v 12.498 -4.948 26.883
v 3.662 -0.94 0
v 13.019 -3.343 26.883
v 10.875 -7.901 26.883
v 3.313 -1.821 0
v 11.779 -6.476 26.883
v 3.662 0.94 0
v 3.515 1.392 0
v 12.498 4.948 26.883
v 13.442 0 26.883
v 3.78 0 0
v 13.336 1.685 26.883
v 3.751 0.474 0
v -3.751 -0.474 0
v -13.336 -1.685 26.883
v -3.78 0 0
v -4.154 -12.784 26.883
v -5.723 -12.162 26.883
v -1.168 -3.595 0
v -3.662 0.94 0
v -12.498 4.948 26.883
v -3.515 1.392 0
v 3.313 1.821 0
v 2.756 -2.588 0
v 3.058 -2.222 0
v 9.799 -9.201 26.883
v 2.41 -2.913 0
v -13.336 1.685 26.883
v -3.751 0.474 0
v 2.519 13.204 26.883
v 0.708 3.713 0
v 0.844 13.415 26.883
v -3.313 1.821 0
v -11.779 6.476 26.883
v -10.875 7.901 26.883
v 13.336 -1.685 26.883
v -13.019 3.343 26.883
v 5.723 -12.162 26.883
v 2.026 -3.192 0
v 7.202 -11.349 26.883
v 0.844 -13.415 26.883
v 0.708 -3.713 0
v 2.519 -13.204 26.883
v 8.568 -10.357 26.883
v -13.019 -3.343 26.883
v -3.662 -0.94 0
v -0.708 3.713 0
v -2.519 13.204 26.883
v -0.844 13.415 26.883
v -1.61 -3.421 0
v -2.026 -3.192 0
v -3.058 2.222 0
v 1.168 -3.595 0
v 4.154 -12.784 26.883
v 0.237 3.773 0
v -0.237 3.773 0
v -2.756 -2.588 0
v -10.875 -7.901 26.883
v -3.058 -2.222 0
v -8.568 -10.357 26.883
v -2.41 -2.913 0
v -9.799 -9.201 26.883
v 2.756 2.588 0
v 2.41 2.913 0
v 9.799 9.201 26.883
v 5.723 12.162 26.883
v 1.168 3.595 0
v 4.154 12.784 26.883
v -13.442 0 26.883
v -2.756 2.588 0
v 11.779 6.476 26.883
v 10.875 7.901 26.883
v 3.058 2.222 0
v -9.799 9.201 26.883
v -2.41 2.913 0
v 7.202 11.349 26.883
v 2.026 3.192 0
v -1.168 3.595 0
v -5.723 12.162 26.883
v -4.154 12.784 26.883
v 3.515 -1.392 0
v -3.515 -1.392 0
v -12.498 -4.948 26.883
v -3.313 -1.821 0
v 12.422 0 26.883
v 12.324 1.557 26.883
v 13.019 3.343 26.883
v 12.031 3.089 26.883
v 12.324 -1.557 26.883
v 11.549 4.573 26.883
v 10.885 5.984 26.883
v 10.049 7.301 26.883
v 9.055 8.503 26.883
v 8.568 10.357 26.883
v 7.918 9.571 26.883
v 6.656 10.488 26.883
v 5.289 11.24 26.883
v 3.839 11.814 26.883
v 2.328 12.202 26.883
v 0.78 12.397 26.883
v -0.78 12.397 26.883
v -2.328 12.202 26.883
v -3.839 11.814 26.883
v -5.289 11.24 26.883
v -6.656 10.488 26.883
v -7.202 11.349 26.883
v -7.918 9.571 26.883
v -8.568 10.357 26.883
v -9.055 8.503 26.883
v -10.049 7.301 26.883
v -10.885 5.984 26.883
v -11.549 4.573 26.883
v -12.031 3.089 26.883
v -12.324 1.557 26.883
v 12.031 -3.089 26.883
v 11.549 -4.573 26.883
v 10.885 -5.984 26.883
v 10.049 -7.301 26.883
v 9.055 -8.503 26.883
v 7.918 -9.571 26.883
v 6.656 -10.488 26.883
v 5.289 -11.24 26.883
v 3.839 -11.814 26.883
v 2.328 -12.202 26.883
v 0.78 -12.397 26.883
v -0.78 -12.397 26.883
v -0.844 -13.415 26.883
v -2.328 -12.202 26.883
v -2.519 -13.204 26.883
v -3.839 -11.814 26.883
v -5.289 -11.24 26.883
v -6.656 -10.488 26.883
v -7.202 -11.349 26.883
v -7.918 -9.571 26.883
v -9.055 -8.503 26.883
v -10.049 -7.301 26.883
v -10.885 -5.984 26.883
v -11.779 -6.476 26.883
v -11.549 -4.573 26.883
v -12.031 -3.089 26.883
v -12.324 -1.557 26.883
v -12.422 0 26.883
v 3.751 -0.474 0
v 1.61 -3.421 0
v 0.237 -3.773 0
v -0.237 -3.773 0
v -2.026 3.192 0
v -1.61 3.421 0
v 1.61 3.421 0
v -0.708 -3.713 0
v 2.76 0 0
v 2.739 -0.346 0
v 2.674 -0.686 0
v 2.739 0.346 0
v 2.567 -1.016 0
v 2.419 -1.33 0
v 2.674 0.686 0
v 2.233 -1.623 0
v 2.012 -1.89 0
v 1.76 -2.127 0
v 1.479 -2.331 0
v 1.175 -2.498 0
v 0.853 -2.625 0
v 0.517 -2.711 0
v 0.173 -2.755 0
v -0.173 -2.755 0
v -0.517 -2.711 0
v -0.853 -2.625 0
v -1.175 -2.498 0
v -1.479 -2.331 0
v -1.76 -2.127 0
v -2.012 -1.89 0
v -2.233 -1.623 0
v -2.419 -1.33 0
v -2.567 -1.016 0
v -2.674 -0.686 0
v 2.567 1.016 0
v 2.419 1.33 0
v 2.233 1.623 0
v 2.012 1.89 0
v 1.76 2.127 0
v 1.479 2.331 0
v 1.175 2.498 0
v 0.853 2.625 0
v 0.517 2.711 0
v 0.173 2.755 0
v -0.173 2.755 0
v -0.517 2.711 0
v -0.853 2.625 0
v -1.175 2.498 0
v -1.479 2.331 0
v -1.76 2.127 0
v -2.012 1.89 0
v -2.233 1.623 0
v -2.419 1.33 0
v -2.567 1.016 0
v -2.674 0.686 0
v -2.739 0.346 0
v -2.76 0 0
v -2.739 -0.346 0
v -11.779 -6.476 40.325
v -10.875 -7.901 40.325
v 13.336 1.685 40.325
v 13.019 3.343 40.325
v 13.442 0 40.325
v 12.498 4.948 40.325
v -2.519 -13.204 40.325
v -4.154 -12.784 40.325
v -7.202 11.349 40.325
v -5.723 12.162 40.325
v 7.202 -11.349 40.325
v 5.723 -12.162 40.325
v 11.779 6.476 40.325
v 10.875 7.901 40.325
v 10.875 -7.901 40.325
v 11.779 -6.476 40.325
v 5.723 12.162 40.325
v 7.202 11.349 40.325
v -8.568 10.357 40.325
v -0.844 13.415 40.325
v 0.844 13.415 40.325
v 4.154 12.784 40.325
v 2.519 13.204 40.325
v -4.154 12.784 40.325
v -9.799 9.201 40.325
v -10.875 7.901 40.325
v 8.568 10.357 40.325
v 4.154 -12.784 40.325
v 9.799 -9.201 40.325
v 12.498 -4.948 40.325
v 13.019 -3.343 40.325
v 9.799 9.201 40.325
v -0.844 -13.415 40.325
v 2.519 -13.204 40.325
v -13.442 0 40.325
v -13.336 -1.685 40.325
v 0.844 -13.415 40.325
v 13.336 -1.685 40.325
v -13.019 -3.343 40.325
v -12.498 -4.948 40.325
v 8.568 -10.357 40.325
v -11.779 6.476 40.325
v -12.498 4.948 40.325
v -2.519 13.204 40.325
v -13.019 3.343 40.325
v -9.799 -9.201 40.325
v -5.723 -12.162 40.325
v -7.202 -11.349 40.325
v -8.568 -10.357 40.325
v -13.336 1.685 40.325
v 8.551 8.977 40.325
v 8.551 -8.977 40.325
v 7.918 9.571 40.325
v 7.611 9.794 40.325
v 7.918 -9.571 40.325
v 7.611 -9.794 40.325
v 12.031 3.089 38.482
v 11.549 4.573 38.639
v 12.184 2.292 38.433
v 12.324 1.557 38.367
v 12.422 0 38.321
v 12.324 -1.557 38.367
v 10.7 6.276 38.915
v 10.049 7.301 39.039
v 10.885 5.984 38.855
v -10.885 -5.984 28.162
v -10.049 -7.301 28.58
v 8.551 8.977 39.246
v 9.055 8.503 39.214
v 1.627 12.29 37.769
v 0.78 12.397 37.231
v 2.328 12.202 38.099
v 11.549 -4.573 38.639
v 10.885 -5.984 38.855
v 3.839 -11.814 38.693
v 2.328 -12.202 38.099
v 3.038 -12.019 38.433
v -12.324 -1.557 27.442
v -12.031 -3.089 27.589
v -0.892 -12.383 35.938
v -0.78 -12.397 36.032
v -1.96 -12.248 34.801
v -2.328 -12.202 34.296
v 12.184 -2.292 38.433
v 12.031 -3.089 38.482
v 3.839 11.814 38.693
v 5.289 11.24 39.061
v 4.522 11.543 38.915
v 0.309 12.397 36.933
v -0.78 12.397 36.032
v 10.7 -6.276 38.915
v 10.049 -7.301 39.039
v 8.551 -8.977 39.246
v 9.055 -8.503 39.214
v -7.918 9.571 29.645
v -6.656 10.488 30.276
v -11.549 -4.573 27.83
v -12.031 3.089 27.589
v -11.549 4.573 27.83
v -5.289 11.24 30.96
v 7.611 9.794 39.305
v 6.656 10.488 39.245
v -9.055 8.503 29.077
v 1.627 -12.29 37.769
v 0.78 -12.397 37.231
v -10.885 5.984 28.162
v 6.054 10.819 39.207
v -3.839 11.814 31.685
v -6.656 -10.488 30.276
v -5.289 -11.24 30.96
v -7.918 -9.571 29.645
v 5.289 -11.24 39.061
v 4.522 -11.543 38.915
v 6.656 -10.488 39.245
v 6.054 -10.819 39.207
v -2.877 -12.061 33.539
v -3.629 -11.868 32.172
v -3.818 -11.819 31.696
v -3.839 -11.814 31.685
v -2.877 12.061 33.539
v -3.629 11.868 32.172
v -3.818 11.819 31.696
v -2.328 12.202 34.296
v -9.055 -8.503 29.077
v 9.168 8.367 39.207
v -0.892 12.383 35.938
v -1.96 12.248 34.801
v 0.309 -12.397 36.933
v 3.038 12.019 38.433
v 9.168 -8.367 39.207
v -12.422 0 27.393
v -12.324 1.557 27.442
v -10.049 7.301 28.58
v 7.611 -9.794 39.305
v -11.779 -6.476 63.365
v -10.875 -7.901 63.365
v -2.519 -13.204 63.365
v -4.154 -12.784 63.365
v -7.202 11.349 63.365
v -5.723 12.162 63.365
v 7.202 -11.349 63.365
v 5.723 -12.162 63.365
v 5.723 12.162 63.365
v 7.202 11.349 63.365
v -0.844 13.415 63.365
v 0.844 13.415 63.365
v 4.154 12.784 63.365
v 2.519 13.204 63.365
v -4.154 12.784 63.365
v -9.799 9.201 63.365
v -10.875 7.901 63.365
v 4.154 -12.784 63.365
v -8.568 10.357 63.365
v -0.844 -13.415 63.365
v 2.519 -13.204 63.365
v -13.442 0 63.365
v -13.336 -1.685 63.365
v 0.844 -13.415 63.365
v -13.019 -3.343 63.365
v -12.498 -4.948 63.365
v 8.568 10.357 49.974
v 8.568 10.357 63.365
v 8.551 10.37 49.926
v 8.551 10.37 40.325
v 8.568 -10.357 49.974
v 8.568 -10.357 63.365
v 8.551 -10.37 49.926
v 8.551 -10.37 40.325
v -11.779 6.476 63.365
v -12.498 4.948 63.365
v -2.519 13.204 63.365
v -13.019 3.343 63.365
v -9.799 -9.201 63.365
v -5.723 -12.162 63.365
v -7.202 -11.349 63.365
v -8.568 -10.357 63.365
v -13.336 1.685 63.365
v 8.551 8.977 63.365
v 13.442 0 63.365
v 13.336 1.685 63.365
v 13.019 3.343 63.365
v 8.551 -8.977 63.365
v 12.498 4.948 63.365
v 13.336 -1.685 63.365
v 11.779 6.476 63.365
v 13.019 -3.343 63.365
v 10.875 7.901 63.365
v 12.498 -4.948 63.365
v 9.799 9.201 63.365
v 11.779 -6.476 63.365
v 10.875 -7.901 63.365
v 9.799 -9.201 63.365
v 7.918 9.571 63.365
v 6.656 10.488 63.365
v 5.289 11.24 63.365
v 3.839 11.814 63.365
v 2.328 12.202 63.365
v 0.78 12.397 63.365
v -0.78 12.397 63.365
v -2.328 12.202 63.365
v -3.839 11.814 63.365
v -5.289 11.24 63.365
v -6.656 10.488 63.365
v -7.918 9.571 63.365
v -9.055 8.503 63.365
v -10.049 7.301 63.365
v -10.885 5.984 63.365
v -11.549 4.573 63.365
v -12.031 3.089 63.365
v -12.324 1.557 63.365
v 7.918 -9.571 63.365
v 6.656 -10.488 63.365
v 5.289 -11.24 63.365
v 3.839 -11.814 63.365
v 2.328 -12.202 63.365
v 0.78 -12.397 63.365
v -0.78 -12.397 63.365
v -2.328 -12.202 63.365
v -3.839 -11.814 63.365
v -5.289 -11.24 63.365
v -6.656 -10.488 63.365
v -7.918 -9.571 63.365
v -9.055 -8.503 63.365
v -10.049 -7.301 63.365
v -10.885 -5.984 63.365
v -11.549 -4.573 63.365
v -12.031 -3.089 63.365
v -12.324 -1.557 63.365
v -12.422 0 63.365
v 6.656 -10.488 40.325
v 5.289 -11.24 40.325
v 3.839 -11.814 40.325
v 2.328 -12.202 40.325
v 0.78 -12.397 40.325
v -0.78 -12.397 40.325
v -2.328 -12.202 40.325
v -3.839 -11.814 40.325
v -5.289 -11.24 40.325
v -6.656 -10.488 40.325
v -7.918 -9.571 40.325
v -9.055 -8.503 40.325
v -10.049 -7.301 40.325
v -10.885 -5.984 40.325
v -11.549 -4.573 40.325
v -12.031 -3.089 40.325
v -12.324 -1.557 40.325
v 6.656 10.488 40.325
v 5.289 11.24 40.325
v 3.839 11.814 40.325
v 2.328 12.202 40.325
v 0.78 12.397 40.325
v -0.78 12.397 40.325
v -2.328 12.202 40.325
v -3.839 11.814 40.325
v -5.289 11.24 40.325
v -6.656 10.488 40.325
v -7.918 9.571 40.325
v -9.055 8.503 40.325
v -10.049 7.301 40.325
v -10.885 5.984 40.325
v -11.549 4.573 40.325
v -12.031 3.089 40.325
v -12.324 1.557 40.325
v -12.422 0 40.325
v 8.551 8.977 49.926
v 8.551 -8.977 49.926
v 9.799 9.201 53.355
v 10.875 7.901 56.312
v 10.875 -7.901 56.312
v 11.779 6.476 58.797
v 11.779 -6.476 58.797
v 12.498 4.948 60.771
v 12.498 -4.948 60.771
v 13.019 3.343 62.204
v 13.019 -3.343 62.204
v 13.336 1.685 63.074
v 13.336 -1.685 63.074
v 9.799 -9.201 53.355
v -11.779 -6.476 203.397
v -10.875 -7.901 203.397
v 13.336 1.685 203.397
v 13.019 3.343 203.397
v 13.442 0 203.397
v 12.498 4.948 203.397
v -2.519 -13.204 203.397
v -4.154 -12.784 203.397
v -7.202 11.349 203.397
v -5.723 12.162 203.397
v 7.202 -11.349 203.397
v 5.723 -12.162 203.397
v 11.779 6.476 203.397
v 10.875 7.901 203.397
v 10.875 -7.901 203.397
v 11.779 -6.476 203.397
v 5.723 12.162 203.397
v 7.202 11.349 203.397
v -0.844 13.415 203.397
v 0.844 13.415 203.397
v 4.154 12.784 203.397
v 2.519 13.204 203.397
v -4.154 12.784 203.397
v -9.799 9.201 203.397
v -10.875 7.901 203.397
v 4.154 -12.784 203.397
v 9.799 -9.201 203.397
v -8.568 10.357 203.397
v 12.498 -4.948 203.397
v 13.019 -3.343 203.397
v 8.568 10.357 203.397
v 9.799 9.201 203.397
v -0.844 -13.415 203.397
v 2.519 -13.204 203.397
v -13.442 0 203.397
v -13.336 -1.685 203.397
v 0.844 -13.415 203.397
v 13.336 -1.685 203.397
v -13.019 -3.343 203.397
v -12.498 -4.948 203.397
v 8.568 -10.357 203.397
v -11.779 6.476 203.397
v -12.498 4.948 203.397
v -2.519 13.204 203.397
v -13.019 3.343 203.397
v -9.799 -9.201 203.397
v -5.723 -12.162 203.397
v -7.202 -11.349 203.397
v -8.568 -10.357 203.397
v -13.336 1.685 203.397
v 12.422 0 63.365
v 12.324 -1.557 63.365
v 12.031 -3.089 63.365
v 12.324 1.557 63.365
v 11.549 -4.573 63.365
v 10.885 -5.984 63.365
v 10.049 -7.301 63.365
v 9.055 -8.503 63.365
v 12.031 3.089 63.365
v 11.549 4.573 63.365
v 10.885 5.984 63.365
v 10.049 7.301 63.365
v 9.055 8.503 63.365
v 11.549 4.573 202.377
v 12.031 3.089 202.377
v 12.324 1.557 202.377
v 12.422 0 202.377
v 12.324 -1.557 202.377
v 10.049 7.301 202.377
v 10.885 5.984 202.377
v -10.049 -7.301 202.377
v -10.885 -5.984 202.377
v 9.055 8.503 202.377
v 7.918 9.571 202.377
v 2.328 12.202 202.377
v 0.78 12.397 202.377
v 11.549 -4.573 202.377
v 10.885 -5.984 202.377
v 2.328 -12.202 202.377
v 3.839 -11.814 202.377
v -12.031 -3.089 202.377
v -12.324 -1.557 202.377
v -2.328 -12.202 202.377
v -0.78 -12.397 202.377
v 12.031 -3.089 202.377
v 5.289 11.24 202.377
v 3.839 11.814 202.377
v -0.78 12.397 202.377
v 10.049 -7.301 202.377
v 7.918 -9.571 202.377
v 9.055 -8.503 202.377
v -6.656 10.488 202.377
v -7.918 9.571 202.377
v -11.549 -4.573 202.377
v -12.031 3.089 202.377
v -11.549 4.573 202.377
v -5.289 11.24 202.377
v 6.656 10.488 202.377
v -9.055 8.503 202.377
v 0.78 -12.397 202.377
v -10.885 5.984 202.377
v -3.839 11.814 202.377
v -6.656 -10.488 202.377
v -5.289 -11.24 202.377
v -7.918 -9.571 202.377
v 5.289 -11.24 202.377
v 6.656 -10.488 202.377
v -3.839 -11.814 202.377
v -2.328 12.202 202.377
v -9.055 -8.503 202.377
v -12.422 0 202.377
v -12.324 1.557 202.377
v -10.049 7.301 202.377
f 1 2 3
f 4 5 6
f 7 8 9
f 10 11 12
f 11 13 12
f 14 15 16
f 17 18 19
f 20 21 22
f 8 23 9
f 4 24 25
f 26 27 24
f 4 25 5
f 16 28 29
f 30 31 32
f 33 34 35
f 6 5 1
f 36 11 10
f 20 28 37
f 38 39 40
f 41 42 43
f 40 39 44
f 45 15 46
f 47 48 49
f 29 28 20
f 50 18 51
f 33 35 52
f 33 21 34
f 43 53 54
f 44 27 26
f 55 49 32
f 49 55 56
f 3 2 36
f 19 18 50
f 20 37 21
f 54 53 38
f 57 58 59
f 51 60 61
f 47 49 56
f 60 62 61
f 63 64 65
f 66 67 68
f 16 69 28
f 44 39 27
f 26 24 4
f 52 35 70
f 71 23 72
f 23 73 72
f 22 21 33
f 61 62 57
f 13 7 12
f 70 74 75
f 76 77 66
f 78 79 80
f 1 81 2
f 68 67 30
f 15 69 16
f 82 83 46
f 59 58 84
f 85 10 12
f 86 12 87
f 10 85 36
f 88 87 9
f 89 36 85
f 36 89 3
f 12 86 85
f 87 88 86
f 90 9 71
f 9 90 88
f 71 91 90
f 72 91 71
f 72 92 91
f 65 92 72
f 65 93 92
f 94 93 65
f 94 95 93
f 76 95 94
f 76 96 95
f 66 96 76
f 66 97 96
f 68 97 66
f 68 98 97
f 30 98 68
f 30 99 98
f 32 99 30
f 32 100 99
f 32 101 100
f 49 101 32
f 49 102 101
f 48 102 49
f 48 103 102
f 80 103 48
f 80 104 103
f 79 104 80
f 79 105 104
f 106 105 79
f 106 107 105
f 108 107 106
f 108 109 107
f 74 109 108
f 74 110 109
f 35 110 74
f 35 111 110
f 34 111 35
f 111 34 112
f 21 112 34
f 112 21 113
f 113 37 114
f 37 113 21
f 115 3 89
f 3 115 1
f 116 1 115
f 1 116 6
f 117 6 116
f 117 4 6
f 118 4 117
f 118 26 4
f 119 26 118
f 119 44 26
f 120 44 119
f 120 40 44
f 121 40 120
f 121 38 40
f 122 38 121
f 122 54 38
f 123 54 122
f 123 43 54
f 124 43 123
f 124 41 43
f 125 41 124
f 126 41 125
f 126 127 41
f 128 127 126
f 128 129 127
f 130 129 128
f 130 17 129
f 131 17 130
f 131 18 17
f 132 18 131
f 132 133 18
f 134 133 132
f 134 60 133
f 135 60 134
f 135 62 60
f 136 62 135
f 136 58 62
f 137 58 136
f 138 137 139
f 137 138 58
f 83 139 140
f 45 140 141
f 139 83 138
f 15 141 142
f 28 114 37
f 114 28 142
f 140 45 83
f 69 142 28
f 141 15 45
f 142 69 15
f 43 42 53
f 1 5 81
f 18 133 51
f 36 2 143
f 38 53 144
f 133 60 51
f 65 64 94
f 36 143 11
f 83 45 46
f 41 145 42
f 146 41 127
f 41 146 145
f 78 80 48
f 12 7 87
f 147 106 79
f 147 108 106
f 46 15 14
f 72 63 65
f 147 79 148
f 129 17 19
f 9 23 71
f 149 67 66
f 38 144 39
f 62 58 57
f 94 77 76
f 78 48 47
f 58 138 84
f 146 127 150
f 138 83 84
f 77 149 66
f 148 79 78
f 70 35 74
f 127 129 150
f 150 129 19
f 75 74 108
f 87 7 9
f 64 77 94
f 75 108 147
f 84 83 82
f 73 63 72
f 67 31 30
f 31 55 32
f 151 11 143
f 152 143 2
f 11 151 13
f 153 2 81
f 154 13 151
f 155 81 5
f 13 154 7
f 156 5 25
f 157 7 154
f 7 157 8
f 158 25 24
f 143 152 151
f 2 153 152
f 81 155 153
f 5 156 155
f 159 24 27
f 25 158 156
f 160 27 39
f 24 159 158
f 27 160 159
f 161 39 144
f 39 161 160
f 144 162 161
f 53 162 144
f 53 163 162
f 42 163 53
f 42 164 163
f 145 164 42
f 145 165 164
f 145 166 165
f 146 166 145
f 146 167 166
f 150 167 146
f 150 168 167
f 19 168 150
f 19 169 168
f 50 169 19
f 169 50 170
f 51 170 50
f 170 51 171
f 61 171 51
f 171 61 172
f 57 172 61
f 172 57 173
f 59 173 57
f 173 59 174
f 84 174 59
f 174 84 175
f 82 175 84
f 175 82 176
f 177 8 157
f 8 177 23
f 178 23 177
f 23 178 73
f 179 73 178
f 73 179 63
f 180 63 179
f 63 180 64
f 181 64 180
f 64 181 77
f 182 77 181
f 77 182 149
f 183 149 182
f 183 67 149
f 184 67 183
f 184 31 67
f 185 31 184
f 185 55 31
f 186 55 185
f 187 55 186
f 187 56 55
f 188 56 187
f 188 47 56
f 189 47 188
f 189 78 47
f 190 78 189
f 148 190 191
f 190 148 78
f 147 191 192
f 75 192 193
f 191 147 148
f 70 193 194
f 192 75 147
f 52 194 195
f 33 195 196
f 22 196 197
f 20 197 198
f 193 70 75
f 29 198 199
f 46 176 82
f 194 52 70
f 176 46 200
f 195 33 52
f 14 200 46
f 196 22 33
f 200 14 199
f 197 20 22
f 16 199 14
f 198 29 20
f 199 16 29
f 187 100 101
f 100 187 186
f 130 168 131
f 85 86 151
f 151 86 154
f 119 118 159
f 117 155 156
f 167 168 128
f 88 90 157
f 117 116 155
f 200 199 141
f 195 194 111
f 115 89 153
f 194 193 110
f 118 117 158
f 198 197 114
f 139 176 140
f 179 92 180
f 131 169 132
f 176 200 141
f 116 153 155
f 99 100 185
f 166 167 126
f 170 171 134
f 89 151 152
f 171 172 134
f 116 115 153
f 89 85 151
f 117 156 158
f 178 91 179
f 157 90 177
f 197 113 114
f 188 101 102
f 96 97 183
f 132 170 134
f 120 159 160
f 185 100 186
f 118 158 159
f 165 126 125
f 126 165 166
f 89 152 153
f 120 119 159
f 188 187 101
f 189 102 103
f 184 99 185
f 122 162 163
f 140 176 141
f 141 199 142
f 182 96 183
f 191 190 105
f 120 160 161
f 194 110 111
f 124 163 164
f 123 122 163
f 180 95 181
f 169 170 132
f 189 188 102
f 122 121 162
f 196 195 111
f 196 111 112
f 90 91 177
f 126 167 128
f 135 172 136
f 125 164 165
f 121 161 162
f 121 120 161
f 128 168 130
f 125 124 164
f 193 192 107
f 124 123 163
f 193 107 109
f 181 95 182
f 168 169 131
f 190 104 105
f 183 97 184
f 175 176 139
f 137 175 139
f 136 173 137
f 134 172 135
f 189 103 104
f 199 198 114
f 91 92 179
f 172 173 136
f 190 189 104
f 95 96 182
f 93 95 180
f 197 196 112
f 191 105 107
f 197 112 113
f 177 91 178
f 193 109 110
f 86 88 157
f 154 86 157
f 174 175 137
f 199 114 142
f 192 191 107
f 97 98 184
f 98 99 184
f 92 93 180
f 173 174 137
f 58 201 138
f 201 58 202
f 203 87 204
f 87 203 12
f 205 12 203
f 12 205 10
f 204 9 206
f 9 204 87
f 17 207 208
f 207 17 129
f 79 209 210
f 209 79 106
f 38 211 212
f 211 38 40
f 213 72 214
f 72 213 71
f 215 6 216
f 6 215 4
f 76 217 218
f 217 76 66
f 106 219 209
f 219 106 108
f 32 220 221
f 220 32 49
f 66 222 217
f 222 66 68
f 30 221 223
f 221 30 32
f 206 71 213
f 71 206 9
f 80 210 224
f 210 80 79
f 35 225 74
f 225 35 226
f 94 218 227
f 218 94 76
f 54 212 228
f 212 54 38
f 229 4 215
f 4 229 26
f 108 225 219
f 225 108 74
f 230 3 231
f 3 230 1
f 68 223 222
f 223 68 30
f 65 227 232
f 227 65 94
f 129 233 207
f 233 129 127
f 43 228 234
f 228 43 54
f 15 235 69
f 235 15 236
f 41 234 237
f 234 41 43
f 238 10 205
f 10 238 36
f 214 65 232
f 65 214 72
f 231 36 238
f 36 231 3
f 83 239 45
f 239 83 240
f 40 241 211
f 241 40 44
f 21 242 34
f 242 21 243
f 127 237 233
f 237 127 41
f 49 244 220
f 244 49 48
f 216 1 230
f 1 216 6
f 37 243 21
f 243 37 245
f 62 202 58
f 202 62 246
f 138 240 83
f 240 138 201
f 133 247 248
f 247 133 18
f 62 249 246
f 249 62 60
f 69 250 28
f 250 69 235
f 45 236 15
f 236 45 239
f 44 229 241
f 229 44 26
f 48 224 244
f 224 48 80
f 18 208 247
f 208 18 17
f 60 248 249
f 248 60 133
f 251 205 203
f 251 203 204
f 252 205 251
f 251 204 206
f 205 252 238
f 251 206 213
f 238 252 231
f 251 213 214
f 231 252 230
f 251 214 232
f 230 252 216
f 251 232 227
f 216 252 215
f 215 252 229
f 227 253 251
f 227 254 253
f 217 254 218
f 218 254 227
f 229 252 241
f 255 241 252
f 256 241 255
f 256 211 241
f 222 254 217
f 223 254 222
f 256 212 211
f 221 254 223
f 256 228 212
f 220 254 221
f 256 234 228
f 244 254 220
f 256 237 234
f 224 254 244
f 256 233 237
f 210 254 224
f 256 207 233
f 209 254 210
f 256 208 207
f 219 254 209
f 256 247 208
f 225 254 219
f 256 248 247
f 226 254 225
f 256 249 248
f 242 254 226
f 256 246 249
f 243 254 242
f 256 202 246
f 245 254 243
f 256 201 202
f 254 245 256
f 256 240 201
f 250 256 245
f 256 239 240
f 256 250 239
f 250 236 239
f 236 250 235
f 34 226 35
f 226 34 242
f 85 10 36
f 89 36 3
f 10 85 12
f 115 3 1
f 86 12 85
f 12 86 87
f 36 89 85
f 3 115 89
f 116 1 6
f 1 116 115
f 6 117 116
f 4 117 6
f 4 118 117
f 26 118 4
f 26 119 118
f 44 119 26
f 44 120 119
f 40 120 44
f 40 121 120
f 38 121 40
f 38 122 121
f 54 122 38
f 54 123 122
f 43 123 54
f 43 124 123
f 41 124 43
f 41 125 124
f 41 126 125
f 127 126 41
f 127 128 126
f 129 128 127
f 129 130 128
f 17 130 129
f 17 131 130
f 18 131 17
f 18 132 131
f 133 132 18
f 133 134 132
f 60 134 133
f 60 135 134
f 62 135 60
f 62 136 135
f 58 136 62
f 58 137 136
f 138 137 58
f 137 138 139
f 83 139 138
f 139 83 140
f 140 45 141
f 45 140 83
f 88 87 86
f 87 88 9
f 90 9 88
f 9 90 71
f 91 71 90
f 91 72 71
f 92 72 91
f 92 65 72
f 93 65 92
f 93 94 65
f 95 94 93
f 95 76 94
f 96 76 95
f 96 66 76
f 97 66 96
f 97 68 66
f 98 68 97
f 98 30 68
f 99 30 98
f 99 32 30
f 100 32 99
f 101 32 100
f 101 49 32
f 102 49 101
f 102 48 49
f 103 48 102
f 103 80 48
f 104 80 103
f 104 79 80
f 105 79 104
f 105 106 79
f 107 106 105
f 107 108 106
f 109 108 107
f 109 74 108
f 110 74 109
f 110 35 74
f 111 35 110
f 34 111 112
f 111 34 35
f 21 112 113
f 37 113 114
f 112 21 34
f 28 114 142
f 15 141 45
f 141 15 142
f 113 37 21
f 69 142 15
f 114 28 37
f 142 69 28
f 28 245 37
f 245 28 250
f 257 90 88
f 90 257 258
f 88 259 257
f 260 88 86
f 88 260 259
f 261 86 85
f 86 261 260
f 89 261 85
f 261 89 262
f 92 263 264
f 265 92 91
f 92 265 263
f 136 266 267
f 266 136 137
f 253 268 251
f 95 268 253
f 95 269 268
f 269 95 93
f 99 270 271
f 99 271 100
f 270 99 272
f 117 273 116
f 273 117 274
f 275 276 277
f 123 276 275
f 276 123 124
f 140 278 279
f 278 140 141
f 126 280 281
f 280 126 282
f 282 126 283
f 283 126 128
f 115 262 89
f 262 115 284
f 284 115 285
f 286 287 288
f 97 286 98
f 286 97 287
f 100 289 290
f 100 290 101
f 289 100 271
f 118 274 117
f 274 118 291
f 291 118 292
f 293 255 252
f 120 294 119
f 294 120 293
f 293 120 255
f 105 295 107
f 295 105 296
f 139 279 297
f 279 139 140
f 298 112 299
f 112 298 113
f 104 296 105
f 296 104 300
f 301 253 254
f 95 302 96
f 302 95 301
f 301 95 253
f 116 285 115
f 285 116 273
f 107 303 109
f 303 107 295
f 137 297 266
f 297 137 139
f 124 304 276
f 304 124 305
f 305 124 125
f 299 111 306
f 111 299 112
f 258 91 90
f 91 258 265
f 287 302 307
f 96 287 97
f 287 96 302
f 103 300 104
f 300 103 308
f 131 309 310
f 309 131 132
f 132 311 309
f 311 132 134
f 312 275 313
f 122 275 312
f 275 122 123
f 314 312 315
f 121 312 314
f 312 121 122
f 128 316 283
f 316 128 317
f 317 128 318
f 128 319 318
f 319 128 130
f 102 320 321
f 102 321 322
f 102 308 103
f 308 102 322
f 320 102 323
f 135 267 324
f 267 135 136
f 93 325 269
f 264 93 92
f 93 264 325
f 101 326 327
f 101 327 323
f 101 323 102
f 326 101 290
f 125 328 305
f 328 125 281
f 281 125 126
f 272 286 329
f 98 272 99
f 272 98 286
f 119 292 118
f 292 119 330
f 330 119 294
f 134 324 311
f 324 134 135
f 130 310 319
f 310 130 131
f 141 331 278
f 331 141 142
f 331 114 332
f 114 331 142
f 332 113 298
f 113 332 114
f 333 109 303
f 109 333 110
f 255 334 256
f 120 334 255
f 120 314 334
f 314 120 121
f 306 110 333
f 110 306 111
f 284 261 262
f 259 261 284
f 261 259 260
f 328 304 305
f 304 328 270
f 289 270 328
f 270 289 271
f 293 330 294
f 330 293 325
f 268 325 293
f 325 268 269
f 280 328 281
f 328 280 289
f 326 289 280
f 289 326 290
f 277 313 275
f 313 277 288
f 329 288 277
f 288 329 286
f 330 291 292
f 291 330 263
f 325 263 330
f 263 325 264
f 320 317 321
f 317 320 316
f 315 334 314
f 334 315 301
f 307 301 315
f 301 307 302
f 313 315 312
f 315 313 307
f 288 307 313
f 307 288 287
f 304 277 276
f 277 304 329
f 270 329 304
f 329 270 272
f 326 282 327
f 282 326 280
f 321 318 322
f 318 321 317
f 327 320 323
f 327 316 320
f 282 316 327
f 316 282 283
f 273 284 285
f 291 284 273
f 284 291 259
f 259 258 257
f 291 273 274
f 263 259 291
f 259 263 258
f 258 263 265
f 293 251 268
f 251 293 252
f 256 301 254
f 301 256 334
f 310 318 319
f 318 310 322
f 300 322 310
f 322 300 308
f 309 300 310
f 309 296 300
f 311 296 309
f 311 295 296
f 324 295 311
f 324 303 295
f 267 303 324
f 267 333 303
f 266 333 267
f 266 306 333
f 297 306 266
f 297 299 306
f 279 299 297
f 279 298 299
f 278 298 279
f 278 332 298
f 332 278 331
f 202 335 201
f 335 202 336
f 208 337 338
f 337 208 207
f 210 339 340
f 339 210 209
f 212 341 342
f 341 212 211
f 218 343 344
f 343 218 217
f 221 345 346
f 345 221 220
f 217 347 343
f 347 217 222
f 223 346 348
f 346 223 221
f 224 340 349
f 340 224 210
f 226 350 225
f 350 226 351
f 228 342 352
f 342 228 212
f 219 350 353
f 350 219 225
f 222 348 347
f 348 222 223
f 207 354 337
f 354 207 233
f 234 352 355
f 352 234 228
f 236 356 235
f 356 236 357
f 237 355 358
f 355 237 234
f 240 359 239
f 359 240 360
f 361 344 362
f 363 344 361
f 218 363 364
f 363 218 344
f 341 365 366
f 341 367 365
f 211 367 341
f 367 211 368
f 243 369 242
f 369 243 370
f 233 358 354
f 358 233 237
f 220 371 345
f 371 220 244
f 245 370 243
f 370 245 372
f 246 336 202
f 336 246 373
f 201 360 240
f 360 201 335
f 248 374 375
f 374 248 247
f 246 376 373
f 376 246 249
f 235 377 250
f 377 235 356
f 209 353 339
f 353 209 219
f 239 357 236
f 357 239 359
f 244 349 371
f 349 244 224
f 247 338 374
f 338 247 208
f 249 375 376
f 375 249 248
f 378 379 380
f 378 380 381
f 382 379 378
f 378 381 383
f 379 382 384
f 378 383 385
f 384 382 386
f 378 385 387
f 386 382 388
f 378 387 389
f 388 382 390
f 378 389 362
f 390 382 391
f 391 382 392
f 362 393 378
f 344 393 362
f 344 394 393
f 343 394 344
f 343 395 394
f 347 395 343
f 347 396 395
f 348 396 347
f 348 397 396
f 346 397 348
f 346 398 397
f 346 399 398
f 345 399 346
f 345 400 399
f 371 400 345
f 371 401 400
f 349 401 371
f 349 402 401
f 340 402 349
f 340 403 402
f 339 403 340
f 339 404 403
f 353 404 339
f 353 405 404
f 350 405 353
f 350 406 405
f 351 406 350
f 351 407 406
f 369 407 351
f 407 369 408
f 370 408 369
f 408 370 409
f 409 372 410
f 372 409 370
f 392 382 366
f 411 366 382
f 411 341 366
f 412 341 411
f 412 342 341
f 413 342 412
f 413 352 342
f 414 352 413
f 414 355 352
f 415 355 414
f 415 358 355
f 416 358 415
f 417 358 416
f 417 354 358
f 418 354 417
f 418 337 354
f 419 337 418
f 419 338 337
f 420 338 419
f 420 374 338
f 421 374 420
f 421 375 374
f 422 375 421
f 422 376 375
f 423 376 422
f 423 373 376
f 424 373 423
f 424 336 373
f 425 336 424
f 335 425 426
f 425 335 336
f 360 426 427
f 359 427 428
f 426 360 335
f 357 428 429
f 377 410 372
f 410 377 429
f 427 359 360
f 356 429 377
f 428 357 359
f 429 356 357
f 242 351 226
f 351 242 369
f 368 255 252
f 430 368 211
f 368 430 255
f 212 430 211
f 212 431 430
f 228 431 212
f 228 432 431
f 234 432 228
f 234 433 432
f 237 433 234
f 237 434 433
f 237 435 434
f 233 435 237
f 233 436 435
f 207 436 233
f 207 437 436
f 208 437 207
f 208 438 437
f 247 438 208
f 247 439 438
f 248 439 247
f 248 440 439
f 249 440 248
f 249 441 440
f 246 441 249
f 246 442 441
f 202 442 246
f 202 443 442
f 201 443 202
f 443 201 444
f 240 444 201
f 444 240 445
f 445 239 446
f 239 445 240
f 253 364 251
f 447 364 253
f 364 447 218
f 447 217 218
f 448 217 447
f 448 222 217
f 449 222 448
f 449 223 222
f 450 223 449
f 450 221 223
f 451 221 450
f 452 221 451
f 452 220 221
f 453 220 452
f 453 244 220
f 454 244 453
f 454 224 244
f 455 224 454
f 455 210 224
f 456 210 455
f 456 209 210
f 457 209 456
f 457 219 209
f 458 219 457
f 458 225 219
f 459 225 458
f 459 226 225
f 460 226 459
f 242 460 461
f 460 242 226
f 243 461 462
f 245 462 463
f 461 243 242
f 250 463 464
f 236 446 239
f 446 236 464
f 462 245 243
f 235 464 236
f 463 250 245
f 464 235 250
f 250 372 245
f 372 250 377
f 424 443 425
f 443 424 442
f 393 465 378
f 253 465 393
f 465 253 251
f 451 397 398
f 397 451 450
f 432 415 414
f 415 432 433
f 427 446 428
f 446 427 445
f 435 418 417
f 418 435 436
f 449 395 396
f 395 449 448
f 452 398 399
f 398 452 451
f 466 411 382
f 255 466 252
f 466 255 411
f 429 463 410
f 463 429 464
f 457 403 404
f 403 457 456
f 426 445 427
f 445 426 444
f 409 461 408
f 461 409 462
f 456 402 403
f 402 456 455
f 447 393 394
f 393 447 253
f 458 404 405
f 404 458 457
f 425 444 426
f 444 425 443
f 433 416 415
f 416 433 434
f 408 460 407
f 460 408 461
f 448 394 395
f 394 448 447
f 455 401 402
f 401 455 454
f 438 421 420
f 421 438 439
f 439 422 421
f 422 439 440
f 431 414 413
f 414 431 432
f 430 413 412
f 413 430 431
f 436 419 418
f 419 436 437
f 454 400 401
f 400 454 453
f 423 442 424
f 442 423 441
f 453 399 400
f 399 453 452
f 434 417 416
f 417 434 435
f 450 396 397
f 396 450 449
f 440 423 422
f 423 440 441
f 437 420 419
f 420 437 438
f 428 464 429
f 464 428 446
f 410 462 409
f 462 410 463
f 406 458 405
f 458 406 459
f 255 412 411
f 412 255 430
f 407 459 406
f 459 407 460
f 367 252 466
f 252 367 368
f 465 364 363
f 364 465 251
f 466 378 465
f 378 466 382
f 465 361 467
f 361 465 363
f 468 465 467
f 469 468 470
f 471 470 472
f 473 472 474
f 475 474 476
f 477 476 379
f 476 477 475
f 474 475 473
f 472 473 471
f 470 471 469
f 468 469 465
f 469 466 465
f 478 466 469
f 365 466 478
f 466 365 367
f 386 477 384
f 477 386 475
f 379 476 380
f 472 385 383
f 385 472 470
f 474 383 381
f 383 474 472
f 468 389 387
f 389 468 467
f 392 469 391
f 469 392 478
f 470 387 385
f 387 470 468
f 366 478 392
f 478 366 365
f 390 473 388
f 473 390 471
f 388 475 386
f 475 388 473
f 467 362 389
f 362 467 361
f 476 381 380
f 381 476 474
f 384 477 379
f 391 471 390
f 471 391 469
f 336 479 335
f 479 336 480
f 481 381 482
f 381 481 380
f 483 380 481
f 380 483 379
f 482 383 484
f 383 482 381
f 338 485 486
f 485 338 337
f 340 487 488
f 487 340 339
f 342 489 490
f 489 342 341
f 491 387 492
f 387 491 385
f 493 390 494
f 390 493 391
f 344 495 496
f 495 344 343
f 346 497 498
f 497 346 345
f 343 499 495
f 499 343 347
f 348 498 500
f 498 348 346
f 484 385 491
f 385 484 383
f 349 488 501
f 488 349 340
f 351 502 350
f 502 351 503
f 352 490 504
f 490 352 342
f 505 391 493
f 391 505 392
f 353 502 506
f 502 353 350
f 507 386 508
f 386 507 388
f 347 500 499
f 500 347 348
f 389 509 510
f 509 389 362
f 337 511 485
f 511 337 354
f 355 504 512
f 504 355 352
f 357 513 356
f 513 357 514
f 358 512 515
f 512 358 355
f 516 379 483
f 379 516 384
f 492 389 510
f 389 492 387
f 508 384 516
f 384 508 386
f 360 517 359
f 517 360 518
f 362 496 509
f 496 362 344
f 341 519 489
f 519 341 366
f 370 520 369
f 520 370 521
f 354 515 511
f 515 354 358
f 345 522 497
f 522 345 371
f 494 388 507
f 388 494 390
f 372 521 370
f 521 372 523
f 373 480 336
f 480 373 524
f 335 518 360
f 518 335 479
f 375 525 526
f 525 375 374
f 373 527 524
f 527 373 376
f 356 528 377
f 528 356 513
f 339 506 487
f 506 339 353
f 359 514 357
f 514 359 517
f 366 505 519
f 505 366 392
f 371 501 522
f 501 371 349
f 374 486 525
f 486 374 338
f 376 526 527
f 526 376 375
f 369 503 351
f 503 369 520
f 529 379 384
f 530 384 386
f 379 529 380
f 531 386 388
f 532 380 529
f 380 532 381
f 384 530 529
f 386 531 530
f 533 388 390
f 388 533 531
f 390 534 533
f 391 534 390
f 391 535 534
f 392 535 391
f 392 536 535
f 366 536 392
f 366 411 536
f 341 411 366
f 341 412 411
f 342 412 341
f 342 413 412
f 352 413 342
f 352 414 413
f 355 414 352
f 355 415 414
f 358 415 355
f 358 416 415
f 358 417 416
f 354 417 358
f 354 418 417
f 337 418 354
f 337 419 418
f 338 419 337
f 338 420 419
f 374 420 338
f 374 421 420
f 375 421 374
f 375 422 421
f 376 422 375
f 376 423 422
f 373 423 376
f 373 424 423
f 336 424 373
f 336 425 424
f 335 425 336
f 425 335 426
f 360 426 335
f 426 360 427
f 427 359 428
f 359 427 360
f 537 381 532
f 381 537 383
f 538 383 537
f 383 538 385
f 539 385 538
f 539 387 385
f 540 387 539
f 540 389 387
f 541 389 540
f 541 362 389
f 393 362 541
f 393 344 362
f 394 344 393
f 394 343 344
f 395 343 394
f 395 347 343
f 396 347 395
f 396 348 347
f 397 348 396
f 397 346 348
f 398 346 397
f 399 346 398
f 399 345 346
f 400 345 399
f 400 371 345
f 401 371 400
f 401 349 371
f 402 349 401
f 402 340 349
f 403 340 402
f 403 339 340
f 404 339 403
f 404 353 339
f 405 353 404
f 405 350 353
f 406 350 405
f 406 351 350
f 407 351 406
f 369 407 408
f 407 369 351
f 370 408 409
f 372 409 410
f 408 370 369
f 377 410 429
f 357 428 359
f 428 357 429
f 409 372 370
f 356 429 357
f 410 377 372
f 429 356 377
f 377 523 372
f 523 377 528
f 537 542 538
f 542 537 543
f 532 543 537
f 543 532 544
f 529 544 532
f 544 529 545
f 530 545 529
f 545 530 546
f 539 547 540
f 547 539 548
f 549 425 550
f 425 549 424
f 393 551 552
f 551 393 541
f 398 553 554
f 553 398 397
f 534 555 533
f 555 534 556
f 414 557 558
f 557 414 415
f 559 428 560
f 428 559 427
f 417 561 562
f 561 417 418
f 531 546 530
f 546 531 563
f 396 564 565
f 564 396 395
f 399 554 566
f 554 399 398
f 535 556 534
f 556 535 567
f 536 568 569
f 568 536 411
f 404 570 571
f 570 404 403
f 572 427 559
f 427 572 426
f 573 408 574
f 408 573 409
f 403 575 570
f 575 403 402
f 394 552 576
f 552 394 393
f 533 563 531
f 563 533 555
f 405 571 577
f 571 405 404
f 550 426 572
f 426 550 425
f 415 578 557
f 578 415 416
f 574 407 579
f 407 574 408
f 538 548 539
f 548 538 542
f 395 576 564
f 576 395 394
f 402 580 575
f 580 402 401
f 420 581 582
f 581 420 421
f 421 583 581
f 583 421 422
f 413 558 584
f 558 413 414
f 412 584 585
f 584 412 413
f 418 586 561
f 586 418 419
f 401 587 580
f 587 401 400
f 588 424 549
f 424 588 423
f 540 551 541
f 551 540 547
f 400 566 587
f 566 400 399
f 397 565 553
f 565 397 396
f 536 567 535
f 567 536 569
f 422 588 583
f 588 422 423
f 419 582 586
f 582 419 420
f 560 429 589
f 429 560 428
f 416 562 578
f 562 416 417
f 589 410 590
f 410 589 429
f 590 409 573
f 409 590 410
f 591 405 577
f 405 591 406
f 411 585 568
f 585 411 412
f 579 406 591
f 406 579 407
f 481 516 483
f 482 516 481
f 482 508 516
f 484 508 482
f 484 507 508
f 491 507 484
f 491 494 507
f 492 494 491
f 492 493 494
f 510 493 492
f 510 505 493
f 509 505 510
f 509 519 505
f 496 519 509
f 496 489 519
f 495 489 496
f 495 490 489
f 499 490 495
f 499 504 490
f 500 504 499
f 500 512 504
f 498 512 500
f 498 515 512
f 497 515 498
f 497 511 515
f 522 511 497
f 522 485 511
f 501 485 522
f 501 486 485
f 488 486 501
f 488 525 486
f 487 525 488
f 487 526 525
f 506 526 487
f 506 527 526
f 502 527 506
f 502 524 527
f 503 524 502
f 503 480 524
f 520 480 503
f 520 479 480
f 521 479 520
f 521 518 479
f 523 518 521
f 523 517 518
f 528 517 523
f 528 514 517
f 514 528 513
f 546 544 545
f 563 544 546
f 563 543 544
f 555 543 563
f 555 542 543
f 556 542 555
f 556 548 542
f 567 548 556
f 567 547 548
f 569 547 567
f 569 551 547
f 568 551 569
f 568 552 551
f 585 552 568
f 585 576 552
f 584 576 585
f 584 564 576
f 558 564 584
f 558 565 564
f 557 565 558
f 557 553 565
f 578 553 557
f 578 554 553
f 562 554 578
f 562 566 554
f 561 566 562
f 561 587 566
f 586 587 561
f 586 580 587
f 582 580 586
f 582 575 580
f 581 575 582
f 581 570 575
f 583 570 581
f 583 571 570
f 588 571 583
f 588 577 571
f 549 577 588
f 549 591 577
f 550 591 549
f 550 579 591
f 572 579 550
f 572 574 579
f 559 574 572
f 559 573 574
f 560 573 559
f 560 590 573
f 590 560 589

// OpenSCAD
//Parameters
ID = 24.84344;
Wall_thickness = 1.02;
Pipe_length = 162.052;
Mouth_height = 9.6012;
WST = 0.9398;
IW = 19.6342;
Cap = 1; //1=yes, 0=no
Lip_angle = 20;



//Intermediate variables

Foot_hole_radius = ID/9;
Foot_wall = Wall_thickness;


OD = ID+(2*Wall_thickness);
SU = OD/2;  //SU is standard arbitrary unit equal to outer radius


prism_width = OD;

windsheet_displacement = sqrt(((ID*ID)-(IW*IW))/4);

prism_thickness = SU-(WST+windsheet_displacement);

prism_height = (prism_thickness*sin(70))/(sin(Lip_angle))  ;

Mouth_cylinder_height = prism_height+Mouth_height;

resonator_length = Pipe_length - Mouth_cylinder_height;


foot_vert_disp = 0;
collar_vert_disp = 2*SU;
languid_vert_disp = 2*SU;
mouth_vert_disp = 3*SU;
resonator_vert_disp = 3*SU + Mouth_cylinder_height;
cap_vert_disp = resonator_vert_disp + resonator_length;

languid_thickness = Wall_thickness ;







//Prism module
 module prism(l, w, h){
       polyhedron(
               points=[[0,0,0], [l,0,0], [l,w,0], [0,w,0], [0,w,h], [l,w,h]],
               faces=[[0,1,2,3],[5,4,3,2],[0,4,5,1],[0,3,4],[5,2,1]]
               );
       
       }





//foot of pipe
difference(){
    cylinder(h=2*SU, r1=Foot_hole_radius+Foot_wall, r2=SU, center=false,$fn=50);
    cylinder(h=2*SU,r1=Foot_hole_radius,r2=SU-Wall_thickness, center=false,$fn=50);
}


//wall above foot
translate ([0,0,collar_vert_disp])
    difference(){
        cylinder(h=SU,r1=SU,r2=SU, center =false,$fn=50);
        cylinder(h=SU, r1=SU-Wall_thickness, r2=SU-Wall_thickness,center=false,$fn=50);
    }

//languid
translate([0,0,languid_vert_disp]){
    difference(){
        difference(){   
            difference(){

                cylinder (h=SU,r1=SU,r2=SU,center=false,$fn=50);
                
                rotate ([270,270,0]){
                    translate ([0,windsheet_displacement,0])
                        cylinder (h=2*SU,r1=SU-languid_thickness,r2=SU-languid_thickness,center=true,$fn=50);
                }
            }
            
            translate ([windsheet_displacement,-SU,0])
                cube ([WST,2*SU,SU]);
        }
        
        rotate([270,0,90]){
            translate([-SU,-SU/2,0])
                prism(SU*2,SU/2,SU);
        }
    }
}

//Mouth
translate([0,0,mouth_vert_disp]){
    difference(){
        difference(){
            cylinder(h=Mouth_cylinder_height, r1=SU, r2=SU, center=false,$fn=50);
            cylinder(h=Mouth_cylinder_height,r1=SU-Wall_thickness,r2=SU-Wall_thickness, center=false,$fn=50);
        }
        
       translate([windsheet_displacement+WST,-SU,0])
            cube([SU,SU*2,Mouth_cylinder_height]);
    }
    intersection(){
        translate([windsheet_displacement+WST,-SU,Mouth_height])
            rotate([90,0,90])
                prism(prism_width,prism_height,prism_thickness);
        
        cylinder(h=SU*12,r1=SU,r2=SU, center = false,$fn=50);
        
        }
        
}



//Resonant length    
translate ([0,0,resonator_vert_disp])
    difference(){
        cylinder(h=resonator_length,r1=SU,r2=SU, center =false,$fn=50);
        cylinder(h=resonator_length, r1=SU-Wall_thickness, r2=SU-Wall_thickness,center=false,$fn=50);
   }
    
//Cap
if (Cap==1){
    translate([0,0,cap_vert_disp])
        cylinder(h=languid_thickness,r1=SU,r2=SU, center=false, $fn=50);
}
